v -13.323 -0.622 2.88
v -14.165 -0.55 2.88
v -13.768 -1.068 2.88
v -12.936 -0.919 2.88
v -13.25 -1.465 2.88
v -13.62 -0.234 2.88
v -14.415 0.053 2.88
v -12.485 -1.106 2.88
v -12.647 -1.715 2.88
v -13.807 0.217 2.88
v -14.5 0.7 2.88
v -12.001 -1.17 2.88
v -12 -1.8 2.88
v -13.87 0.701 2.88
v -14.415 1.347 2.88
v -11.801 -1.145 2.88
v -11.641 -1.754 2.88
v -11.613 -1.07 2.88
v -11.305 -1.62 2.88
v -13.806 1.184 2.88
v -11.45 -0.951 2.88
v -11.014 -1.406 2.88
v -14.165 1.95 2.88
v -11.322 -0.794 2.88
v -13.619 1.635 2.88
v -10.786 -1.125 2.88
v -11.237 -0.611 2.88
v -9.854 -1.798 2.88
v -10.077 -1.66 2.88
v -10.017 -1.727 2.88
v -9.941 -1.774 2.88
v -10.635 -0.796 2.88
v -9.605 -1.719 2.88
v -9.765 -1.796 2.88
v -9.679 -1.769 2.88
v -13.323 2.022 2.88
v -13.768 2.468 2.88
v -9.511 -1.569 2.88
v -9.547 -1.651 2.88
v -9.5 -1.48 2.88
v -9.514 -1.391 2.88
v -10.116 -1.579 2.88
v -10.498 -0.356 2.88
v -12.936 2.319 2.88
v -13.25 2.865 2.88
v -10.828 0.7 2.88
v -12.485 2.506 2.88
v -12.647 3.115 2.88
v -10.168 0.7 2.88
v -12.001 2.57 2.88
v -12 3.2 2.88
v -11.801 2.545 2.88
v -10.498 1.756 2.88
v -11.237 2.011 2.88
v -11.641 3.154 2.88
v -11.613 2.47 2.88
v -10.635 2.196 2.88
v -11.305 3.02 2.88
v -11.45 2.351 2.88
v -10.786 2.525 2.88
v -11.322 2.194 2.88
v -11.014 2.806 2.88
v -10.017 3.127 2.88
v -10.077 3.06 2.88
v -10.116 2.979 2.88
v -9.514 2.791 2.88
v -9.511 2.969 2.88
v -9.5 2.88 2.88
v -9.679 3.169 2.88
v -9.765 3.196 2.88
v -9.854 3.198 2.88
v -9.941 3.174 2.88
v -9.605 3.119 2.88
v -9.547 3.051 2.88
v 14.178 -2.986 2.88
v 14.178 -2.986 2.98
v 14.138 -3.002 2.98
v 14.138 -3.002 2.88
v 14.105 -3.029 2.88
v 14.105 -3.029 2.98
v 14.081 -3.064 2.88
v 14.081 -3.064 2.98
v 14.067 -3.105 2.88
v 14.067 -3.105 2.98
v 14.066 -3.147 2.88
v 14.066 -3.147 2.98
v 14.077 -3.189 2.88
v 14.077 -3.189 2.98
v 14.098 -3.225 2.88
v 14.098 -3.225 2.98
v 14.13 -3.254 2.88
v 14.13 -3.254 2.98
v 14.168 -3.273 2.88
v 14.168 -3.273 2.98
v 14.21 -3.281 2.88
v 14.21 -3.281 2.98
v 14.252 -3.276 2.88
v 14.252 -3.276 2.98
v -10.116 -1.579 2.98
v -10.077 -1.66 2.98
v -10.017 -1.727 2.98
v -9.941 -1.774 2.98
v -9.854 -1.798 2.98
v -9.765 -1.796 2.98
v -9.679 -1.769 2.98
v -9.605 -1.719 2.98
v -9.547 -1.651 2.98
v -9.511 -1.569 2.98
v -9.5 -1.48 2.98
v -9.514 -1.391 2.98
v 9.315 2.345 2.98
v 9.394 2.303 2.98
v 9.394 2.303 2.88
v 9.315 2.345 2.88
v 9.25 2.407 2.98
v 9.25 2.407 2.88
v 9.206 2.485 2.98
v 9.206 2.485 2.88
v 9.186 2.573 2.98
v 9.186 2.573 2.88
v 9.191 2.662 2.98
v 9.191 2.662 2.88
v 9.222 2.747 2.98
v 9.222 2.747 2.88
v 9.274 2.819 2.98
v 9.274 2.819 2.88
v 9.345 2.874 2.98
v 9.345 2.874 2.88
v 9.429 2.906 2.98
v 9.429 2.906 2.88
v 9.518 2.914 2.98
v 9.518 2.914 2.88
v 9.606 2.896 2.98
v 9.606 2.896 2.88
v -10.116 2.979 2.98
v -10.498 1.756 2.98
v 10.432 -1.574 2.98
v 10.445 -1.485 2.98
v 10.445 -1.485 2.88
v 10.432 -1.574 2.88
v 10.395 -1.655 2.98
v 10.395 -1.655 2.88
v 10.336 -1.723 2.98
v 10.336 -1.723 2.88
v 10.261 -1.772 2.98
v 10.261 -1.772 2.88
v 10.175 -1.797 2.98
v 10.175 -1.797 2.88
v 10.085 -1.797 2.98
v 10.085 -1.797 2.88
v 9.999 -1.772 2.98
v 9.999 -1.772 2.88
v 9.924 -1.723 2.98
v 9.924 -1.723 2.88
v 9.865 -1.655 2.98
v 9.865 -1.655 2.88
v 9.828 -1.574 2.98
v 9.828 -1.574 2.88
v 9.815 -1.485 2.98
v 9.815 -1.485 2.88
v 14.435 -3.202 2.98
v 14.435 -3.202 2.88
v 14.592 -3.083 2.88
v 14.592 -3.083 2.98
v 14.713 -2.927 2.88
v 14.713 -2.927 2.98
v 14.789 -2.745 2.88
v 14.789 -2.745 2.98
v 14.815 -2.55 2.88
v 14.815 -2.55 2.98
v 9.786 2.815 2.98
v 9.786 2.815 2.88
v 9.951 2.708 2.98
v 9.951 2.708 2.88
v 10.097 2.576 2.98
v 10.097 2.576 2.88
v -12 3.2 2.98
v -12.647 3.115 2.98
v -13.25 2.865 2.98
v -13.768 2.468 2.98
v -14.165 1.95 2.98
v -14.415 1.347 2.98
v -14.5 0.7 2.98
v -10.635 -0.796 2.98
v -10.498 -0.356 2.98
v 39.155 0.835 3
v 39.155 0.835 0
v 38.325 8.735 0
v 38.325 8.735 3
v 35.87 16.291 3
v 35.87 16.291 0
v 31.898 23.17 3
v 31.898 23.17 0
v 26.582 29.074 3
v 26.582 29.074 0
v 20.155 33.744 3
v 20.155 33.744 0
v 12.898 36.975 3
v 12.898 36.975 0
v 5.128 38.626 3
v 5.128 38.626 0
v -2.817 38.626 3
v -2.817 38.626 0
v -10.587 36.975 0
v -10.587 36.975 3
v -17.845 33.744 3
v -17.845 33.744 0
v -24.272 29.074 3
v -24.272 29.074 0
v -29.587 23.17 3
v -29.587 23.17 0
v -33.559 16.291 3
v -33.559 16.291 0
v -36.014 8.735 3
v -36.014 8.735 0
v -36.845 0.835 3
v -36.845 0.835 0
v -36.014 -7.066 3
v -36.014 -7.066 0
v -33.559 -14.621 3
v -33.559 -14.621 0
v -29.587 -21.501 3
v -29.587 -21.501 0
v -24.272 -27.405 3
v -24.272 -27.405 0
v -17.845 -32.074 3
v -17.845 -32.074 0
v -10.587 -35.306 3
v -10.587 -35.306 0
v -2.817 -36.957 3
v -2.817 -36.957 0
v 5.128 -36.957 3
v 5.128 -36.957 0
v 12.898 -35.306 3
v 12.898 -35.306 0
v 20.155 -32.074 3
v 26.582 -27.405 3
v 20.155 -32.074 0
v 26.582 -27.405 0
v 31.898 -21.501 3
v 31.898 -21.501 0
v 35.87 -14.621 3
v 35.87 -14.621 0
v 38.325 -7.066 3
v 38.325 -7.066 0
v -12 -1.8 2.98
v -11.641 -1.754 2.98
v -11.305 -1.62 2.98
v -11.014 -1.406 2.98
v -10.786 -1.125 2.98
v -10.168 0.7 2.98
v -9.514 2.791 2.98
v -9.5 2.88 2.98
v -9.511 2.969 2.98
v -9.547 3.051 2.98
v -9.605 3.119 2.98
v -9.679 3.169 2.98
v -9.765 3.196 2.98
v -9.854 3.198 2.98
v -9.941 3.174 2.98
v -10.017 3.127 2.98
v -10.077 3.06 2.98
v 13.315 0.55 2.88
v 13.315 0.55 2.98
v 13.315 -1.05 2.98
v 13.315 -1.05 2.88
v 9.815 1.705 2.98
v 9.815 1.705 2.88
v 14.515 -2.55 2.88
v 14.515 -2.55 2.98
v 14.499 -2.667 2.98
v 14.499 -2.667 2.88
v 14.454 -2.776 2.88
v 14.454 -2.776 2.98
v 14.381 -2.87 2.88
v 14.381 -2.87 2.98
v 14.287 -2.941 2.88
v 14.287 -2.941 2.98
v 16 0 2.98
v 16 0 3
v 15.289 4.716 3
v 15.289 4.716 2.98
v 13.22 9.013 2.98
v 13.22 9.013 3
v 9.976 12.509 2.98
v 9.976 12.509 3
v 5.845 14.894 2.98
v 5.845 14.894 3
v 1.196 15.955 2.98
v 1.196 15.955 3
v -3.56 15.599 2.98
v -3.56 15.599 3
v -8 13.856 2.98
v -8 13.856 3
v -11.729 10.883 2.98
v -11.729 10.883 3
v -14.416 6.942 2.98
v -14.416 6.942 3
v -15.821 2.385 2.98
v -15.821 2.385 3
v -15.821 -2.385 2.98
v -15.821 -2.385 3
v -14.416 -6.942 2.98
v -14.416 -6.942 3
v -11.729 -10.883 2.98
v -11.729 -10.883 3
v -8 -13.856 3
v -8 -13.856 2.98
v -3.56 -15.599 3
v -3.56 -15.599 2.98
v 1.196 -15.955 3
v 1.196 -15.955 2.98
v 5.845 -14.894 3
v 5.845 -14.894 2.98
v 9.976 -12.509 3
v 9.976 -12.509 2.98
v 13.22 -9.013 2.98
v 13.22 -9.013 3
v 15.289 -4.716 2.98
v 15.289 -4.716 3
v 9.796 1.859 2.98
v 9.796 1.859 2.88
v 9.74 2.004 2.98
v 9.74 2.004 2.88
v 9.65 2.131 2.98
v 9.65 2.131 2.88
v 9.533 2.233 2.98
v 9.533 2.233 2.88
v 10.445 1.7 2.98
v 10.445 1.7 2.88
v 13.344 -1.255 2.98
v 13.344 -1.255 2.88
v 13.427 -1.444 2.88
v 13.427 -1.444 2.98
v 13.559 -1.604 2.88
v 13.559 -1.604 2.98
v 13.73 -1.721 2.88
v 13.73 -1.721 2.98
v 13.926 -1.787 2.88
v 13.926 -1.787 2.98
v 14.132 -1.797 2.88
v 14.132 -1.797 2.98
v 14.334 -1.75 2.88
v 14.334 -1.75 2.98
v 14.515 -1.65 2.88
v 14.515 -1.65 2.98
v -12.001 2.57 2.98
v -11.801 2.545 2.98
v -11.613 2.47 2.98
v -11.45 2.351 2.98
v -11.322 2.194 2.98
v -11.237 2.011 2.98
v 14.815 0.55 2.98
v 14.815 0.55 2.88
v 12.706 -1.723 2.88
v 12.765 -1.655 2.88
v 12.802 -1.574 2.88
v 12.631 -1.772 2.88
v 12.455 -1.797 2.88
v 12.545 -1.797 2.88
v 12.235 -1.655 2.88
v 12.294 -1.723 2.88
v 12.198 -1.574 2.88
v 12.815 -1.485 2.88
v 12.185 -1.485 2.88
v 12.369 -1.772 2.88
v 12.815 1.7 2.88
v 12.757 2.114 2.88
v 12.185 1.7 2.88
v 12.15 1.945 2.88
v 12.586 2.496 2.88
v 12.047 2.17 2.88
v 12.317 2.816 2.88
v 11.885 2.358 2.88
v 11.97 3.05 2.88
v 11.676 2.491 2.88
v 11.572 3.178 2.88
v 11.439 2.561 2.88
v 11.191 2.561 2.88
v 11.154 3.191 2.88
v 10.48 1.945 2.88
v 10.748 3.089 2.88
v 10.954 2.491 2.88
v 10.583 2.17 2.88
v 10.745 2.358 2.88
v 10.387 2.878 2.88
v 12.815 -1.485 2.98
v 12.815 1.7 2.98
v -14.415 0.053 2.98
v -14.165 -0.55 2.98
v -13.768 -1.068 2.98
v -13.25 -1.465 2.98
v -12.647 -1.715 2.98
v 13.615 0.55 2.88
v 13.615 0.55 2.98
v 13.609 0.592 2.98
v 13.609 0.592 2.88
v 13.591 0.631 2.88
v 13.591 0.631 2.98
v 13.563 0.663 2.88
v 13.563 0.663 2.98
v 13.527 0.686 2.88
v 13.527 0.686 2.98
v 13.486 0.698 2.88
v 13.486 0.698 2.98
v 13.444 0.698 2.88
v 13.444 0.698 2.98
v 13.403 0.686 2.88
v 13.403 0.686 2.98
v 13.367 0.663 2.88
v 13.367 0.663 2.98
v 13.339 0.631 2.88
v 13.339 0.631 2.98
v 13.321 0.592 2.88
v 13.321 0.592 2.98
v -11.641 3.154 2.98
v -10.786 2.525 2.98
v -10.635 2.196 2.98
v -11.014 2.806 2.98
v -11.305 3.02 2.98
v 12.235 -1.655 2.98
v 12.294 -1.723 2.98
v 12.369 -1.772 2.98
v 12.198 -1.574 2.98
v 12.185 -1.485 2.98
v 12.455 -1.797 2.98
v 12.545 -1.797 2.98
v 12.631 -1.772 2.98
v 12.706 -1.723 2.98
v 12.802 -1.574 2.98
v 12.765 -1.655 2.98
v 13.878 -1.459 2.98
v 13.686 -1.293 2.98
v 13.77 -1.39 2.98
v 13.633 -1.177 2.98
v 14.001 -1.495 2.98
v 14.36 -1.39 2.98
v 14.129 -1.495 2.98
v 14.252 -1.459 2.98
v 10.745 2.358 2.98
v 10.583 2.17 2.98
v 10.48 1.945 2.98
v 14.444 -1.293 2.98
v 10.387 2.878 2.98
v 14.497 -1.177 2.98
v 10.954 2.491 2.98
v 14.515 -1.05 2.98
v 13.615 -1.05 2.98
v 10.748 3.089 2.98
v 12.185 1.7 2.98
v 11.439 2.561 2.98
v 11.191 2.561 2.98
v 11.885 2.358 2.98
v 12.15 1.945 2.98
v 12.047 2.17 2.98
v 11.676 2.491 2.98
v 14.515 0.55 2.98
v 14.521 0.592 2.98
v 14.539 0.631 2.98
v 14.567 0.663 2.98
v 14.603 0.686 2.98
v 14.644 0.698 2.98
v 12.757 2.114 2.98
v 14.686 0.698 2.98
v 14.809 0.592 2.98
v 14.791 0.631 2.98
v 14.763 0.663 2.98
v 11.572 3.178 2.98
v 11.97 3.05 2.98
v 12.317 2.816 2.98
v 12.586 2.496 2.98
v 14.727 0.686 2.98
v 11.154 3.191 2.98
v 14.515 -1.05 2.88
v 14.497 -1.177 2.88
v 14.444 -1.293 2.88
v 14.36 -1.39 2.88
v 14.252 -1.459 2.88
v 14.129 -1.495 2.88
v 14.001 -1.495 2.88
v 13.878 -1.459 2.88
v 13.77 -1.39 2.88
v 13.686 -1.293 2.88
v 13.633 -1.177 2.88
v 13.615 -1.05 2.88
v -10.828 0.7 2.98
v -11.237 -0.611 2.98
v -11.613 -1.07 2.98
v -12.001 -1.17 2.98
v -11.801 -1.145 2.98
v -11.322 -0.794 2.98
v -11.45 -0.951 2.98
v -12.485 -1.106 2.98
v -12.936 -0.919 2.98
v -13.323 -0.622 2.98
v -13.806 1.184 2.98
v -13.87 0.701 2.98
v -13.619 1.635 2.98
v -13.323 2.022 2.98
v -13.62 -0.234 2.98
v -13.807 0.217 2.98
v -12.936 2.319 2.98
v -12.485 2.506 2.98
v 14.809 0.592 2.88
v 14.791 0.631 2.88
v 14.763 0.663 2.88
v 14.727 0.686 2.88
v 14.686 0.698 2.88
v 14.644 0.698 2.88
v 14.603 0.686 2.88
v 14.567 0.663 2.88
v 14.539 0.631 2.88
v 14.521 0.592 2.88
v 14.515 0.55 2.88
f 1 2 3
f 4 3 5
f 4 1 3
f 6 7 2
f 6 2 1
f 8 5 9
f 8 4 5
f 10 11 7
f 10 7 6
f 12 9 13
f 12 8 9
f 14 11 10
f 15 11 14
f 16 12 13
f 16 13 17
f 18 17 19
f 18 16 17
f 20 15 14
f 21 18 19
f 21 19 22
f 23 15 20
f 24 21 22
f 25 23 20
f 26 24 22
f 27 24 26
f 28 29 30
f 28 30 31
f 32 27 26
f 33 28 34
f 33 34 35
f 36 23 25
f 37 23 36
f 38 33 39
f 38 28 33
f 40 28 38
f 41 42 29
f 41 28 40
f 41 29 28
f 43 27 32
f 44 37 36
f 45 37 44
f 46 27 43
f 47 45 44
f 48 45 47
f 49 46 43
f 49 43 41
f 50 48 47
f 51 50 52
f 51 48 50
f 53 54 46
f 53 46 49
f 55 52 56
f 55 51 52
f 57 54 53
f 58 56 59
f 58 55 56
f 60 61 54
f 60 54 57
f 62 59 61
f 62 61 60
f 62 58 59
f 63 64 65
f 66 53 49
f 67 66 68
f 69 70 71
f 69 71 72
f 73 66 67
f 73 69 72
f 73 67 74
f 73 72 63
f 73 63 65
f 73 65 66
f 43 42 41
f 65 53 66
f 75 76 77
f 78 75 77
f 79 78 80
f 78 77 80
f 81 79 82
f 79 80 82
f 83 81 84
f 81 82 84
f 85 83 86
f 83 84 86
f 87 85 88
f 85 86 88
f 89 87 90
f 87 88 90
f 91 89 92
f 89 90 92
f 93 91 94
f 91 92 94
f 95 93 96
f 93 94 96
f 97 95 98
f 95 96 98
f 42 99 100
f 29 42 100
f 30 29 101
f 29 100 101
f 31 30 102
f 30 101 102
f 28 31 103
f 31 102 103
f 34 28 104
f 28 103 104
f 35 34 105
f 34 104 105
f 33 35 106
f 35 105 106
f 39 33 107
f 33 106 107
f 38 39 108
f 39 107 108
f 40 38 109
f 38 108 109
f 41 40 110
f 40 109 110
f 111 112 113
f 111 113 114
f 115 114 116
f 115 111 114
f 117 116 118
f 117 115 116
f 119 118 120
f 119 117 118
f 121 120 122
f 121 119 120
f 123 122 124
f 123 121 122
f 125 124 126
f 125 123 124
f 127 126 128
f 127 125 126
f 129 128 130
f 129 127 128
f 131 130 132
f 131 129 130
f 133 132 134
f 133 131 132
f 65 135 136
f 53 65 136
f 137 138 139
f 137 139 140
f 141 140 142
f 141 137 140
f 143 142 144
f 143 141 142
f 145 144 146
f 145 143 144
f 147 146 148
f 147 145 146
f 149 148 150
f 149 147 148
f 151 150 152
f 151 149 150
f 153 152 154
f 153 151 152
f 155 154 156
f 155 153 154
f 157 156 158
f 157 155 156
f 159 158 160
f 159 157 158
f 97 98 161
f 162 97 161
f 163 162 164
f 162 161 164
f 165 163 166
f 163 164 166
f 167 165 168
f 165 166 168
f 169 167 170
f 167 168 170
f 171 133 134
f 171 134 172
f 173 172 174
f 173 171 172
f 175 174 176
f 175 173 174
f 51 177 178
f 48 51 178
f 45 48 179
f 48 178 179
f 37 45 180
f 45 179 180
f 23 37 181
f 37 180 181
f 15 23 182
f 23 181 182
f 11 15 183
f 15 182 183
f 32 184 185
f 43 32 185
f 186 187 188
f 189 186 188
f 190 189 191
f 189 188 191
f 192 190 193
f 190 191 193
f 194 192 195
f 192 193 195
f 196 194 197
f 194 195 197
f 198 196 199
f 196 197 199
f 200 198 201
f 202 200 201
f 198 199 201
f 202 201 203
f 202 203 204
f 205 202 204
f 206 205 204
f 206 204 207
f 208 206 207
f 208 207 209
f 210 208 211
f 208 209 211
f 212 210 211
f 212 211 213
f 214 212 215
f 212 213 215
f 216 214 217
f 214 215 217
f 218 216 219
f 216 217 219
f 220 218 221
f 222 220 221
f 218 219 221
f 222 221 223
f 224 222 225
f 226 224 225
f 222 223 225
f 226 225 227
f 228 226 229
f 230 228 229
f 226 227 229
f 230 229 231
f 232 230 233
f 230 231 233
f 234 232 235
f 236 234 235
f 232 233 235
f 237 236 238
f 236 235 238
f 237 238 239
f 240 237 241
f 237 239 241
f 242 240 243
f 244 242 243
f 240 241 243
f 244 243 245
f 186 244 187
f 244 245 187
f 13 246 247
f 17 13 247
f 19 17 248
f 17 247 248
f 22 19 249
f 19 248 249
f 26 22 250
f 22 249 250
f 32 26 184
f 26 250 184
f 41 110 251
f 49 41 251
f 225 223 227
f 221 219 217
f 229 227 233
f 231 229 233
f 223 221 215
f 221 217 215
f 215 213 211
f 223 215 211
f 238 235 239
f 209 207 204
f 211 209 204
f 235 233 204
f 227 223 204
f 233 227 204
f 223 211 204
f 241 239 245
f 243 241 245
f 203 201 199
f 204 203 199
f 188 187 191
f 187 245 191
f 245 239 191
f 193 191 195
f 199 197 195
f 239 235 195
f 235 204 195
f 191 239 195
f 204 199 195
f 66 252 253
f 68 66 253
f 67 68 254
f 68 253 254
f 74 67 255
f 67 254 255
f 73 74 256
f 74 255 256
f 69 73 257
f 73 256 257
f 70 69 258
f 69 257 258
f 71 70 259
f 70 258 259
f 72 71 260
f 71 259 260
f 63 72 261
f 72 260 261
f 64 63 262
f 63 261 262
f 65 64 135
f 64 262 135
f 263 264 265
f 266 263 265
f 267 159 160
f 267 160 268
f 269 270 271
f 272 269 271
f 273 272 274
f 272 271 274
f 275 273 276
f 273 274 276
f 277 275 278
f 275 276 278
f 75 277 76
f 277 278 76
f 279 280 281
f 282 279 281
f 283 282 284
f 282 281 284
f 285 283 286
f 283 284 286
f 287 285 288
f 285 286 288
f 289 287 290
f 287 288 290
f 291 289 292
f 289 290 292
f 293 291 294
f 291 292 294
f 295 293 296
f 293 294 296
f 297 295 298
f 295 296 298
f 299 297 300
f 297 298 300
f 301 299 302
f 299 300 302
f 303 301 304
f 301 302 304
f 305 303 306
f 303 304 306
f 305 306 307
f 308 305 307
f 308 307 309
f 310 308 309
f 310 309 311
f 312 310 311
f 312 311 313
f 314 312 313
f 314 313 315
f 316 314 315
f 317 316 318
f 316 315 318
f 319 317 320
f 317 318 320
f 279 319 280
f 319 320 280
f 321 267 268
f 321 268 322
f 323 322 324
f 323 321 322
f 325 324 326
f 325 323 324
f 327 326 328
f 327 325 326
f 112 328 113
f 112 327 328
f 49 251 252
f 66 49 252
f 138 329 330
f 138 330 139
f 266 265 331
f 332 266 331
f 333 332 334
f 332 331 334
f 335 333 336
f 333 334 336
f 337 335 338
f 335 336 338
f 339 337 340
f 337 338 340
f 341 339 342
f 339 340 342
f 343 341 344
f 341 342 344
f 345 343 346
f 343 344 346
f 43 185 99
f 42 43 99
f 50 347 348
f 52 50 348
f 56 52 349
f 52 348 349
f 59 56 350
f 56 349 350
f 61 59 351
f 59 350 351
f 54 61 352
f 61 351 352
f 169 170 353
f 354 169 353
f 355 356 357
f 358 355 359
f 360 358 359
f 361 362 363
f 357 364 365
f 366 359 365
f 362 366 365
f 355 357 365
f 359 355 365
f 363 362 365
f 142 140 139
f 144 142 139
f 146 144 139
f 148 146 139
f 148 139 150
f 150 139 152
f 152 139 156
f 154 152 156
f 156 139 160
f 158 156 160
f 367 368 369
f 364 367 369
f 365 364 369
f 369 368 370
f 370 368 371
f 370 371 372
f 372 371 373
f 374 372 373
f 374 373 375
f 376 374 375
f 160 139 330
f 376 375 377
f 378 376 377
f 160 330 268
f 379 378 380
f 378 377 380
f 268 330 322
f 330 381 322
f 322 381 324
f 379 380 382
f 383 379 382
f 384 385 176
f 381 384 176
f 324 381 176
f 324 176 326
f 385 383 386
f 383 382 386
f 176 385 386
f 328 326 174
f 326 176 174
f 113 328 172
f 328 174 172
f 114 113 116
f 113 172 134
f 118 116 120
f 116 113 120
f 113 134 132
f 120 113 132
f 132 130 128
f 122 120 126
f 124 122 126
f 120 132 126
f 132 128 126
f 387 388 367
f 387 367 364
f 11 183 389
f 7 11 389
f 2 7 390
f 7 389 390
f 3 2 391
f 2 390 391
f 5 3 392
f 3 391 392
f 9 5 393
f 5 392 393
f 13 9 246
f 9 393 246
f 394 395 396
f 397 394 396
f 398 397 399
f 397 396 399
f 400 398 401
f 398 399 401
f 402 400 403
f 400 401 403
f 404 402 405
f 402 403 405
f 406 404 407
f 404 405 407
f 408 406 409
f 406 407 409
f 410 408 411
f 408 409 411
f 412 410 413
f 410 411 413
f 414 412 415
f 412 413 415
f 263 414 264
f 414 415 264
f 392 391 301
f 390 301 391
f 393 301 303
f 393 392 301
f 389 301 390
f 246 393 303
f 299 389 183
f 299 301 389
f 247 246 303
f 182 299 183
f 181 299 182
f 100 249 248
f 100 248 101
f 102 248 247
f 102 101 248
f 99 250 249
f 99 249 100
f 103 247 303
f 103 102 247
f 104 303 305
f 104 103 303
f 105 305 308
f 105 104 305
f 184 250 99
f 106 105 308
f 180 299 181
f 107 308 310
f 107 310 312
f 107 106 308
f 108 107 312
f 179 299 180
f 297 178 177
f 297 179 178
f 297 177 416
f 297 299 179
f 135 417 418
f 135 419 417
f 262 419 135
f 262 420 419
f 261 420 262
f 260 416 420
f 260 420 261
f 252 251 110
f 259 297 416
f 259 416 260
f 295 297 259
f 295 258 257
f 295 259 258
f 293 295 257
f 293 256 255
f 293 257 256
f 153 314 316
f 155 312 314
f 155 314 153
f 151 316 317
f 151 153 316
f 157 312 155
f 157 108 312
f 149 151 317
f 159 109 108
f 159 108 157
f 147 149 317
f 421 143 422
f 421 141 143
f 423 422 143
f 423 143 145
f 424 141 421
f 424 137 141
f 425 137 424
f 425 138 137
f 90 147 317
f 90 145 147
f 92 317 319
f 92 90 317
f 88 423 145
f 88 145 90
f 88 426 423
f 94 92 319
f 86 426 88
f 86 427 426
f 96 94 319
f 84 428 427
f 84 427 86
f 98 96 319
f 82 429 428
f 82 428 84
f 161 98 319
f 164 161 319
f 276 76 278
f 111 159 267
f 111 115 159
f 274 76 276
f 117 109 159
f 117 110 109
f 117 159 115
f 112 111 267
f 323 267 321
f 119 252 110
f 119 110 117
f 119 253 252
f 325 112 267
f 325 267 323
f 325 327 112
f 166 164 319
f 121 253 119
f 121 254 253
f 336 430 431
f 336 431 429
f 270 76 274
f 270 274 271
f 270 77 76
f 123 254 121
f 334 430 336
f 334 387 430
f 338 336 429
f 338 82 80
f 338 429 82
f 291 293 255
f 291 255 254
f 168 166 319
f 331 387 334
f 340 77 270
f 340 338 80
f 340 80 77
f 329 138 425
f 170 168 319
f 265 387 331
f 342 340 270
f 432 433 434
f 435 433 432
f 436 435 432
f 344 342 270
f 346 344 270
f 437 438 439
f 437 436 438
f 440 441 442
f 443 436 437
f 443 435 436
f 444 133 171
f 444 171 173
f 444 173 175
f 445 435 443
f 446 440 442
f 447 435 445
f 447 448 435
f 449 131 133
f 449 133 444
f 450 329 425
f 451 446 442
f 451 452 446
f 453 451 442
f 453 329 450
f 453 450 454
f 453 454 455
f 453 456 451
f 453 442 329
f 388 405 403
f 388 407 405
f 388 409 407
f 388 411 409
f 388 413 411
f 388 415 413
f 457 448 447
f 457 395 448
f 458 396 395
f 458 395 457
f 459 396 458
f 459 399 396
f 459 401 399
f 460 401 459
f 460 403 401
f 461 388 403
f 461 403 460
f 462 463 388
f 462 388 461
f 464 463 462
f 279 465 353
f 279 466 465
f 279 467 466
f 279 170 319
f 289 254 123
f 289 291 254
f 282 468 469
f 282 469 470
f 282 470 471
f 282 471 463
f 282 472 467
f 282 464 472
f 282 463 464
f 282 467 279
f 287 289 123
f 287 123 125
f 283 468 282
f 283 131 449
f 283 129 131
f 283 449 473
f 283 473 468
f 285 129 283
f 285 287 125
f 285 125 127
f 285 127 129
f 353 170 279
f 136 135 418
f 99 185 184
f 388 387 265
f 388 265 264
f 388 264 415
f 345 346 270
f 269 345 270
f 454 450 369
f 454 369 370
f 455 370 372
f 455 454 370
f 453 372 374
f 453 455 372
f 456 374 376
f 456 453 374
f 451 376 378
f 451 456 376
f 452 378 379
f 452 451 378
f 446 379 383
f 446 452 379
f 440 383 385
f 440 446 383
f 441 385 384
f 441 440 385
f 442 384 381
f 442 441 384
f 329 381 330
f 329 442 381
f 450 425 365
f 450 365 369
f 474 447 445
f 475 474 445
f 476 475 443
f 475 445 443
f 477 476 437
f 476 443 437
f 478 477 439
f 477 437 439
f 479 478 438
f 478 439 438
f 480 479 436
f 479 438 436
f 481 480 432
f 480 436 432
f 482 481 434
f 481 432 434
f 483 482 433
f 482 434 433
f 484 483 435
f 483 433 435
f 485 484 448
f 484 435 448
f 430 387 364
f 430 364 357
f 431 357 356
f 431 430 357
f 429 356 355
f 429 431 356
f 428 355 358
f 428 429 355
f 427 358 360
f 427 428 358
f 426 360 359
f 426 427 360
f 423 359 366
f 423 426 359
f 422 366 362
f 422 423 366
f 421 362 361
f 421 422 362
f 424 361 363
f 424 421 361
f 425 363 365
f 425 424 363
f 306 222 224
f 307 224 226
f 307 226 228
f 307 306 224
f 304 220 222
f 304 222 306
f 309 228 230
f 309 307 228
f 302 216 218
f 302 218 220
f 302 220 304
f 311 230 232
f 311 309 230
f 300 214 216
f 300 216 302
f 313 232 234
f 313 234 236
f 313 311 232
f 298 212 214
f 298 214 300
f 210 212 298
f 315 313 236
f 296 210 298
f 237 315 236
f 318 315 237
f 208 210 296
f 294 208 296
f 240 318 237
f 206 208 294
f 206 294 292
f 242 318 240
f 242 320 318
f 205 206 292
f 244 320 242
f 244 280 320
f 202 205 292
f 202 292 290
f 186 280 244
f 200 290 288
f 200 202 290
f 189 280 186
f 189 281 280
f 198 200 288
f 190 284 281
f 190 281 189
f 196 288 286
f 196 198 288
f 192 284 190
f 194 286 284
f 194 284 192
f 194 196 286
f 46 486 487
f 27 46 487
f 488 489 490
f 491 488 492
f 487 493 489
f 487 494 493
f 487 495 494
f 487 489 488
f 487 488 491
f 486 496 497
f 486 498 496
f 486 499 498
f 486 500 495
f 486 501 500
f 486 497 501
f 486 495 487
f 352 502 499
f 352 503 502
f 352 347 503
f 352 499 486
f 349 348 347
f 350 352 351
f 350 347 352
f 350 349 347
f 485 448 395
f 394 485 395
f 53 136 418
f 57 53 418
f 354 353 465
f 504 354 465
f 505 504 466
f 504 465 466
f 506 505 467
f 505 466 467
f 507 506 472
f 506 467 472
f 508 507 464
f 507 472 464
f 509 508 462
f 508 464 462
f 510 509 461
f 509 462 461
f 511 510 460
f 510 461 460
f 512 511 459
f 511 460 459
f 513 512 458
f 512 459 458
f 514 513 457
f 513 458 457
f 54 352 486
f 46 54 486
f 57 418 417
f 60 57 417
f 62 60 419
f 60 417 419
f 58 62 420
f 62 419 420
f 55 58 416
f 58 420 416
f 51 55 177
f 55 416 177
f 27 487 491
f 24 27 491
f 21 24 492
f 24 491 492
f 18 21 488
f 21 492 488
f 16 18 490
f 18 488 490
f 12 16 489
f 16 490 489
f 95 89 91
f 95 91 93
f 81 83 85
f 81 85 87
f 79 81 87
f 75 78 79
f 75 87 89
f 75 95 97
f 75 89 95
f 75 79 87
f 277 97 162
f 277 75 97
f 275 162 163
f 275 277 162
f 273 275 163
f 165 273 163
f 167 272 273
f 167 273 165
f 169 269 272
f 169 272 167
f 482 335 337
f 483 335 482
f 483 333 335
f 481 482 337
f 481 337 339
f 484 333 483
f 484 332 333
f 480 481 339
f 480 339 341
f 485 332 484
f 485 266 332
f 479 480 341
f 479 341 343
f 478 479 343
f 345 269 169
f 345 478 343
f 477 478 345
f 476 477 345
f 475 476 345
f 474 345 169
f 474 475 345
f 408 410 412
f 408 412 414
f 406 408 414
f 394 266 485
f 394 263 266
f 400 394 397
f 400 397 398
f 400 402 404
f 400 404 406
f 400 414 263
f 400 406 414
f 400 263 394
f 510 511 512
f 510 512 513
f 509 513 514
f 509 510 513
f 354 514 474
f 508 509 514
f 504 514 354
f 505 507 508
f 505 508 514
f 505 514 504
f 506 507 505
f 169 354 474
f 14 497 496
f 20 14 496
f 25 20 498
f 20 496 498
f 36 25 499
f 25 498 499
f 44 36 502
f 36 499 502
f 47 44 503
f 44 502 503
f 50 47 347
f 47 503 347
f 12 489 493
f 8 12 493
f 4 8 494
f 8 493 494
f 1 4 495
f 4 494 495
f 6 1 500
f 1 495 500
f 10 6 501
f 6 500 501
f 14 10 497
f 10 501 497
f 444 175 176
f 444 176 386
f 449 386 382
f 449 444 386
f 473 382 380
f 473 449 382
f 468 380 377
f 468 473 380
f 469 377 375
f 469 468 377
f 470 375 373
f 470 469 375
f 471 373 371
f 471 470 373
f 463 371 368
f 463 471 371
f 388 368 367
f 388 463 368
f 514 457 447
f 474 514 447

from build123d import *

# Parameters (mm, degrees)
SKETCH_1_R          = 38
EXTRUDE_1_DEPTH     = 3
SKETCH_2_R          = 16
CUT_EXTRUDE_2_DEPTH = 0.02
CUT_EXTRUDE_3_DEPTH = 0.1


with BuildPart() as part:
    # Эскиз1 → Вытянуть1 (new body)
    with BuildSketch(Plane.XY):
        with Locations((1.155432358, 0.834536784)):
            Circle(SKETCH_1_R)
    extrude(amount=EXTRUDE_1_DEPTH)

    # Эскиз2 → Вытянуть2 (cut)
    with BuildSketch(Plane.XY.offset(3)):
        Circle(SKETCH_2_R)
    extrude(amount=-CUT_EXTRUDE_2_DEPTH, mode=Mode.SUBTRACT)

    # Эскиз3 → Вытянуть3 (cut)
    # profile 1 of 3: a face of its own
    with BuildSketch(Plane.XY.offset(2.98)):
        with BuildLine():
            ThreePointArc((9.393894737, 2.302891329), (9.203408238, 2.705588354), (9.606105263, 2.896074853))
            ThreePointArc((9.606105263, 2.896074853), (9.870539579, 2.764896264), (10.097373549, 2.576005609))
            ThreePointArc((10.097373549, 2.576005609), (11.775195787, 3.127662368), (12.815, 1.7))
            Line((12.815, 1.7), (12.815, -1.485))
            ThreePointArc((12.815, -1.485), (12.5, -1.8), (12.185, -1.485))
            Line((12.185, -1.485), (12.185, 1.7))
            ThreePointArc((12.185, 1.7), (11.315, 2.57), (10.445, 1.7))
            Line((10.445, 1.7), (10.445, -1.485))
            ThreePointArc((10.445, -1.485), (10.13, -1.8), (9.815, -1.485))
            Line((9.815, -1.485), (9.815, 1.7))
            Line((9.815, 1.7), (9.815, 1.705))
            ThreePointArc((9.815, 1.705), (9.699157085, 2.070651365), (9.393894737, 2.302891329))
        make_face()
    # profile 2 of 3: a face of its own
    with BuildSketch(Plane.XY.offset(2.98)):
        with BuildLine():
            Line((-10.497591493, 1.756383955), (-10.635054332, 2.196407461))
            ThreePointArc((-10.635054332, 2.196407461), (-11.152905752, 2.922098665), (-12, 3.2))
            ThreePointArc((-12, 3.2), (-13.767766953, 2.467766953), (-14.5, 0.7))
            ThreePointArc((-14.5, 0.7), (-13.767766953, -1.067766953), (-12, -1.8))
            ThreePointArc((-12, -1.8), (-11.152905752, -1.522098665), (-10.635054332, -0.796407461))
            Line((-10.635054332, -0.796407461), (-10.497591493, -0.356383955))
            Line((-10.497591493, -0.356383955), (-10.11566985, -1.578928916))
            ThreePointArc((-10.11566985, -1.578928916), (-9.721071084, -1.78566985), (-9.51433015, -1.391071084))
            Line((-9.51433015, -1.391071084), (-10.167578358, 0.7))
            Line((-10.167578358, 0.7), (-9.51433015, 2.791071084))
            ThreePointArc((-9.51433015, 2.791071084), (-9.721071084, 3.18566985), (-10.11566985, 2.978928916))
            Line((-10.11566985, 2.978928916), (-10.497591493, 1.756383955))
        make_face()
        with BuildLine():
            Line((-10.827604629, 0.7), (-11.237145368, -0.610954683))
            ThreePointArc((-11.237145368, -0.610954683), (-11.527689249, -1.01570067), (-12.001425757, -1.170001613))
            ThreePointArc((-12.001425757, -1.170001613), (-13.32305175, -0.621529891), (-13.87000042, 0.700727136))
            ThreePointArc((-13.87000042, 0.700727136), (-13.322537782, 2.02204425), (-12.001425757, 2.570001613))
            ThreePointArc((-12.001425757, 2.570001613), (-11.527689249, 2.41570067), (-11.237145368, 2.010954683))
            Line((-11.237145368, 2.010954683), (-10.827604629, 0.7))
        make_face(mode=Mode.SUBTRACT)
    # profile 3 of 3: a face of its own
    with BuildSketch(Plane.XY.offset(2.98)):
        with BuildLine():
            ThreePointArc((14.515, -2.55), (14.420756237, -2.825567596), (14.1775, -2.985710626))
            ThreePointArc((14.1775, -2.985710626), (14.069763125, -3.168447502), (14.2525, -3.276184377))
            ThreePointArc((14.2525, -3.276184377), (14.657927061, -3.009279327), (14.815, -2.55))
            Line((14.815, -2.55), (14.815, 0.55))
            ThreePointArc((14.815, 0.55), (14.665, 0.7), (14.515, 0.55))
            Line((14.515, 0.55), (14.515, -1.05))
            ThreePointArc((14.515, -1.05), (14.065, -1.5), (13.615, -1.05))
            Line((13.615, -1.05), (13.615, 0.55))
            ThreePointArc((13.615, 0.55), (13.465, 0.7), (13.315, 0.55))
            Line((13.315, 0.55), (13.315, -1.05))
            ThreePointArc((13.315, -1.05), (13.729589803, -1.720820393), (14.515, -1.65))
            Line((14.515, -1.65), (14.515, -2.55))
        make_face()
    extrude(amount=-CUT_EXTRUDE_3_DEPTH, mode=Mode.SUBTRACT)


solid = part.part
